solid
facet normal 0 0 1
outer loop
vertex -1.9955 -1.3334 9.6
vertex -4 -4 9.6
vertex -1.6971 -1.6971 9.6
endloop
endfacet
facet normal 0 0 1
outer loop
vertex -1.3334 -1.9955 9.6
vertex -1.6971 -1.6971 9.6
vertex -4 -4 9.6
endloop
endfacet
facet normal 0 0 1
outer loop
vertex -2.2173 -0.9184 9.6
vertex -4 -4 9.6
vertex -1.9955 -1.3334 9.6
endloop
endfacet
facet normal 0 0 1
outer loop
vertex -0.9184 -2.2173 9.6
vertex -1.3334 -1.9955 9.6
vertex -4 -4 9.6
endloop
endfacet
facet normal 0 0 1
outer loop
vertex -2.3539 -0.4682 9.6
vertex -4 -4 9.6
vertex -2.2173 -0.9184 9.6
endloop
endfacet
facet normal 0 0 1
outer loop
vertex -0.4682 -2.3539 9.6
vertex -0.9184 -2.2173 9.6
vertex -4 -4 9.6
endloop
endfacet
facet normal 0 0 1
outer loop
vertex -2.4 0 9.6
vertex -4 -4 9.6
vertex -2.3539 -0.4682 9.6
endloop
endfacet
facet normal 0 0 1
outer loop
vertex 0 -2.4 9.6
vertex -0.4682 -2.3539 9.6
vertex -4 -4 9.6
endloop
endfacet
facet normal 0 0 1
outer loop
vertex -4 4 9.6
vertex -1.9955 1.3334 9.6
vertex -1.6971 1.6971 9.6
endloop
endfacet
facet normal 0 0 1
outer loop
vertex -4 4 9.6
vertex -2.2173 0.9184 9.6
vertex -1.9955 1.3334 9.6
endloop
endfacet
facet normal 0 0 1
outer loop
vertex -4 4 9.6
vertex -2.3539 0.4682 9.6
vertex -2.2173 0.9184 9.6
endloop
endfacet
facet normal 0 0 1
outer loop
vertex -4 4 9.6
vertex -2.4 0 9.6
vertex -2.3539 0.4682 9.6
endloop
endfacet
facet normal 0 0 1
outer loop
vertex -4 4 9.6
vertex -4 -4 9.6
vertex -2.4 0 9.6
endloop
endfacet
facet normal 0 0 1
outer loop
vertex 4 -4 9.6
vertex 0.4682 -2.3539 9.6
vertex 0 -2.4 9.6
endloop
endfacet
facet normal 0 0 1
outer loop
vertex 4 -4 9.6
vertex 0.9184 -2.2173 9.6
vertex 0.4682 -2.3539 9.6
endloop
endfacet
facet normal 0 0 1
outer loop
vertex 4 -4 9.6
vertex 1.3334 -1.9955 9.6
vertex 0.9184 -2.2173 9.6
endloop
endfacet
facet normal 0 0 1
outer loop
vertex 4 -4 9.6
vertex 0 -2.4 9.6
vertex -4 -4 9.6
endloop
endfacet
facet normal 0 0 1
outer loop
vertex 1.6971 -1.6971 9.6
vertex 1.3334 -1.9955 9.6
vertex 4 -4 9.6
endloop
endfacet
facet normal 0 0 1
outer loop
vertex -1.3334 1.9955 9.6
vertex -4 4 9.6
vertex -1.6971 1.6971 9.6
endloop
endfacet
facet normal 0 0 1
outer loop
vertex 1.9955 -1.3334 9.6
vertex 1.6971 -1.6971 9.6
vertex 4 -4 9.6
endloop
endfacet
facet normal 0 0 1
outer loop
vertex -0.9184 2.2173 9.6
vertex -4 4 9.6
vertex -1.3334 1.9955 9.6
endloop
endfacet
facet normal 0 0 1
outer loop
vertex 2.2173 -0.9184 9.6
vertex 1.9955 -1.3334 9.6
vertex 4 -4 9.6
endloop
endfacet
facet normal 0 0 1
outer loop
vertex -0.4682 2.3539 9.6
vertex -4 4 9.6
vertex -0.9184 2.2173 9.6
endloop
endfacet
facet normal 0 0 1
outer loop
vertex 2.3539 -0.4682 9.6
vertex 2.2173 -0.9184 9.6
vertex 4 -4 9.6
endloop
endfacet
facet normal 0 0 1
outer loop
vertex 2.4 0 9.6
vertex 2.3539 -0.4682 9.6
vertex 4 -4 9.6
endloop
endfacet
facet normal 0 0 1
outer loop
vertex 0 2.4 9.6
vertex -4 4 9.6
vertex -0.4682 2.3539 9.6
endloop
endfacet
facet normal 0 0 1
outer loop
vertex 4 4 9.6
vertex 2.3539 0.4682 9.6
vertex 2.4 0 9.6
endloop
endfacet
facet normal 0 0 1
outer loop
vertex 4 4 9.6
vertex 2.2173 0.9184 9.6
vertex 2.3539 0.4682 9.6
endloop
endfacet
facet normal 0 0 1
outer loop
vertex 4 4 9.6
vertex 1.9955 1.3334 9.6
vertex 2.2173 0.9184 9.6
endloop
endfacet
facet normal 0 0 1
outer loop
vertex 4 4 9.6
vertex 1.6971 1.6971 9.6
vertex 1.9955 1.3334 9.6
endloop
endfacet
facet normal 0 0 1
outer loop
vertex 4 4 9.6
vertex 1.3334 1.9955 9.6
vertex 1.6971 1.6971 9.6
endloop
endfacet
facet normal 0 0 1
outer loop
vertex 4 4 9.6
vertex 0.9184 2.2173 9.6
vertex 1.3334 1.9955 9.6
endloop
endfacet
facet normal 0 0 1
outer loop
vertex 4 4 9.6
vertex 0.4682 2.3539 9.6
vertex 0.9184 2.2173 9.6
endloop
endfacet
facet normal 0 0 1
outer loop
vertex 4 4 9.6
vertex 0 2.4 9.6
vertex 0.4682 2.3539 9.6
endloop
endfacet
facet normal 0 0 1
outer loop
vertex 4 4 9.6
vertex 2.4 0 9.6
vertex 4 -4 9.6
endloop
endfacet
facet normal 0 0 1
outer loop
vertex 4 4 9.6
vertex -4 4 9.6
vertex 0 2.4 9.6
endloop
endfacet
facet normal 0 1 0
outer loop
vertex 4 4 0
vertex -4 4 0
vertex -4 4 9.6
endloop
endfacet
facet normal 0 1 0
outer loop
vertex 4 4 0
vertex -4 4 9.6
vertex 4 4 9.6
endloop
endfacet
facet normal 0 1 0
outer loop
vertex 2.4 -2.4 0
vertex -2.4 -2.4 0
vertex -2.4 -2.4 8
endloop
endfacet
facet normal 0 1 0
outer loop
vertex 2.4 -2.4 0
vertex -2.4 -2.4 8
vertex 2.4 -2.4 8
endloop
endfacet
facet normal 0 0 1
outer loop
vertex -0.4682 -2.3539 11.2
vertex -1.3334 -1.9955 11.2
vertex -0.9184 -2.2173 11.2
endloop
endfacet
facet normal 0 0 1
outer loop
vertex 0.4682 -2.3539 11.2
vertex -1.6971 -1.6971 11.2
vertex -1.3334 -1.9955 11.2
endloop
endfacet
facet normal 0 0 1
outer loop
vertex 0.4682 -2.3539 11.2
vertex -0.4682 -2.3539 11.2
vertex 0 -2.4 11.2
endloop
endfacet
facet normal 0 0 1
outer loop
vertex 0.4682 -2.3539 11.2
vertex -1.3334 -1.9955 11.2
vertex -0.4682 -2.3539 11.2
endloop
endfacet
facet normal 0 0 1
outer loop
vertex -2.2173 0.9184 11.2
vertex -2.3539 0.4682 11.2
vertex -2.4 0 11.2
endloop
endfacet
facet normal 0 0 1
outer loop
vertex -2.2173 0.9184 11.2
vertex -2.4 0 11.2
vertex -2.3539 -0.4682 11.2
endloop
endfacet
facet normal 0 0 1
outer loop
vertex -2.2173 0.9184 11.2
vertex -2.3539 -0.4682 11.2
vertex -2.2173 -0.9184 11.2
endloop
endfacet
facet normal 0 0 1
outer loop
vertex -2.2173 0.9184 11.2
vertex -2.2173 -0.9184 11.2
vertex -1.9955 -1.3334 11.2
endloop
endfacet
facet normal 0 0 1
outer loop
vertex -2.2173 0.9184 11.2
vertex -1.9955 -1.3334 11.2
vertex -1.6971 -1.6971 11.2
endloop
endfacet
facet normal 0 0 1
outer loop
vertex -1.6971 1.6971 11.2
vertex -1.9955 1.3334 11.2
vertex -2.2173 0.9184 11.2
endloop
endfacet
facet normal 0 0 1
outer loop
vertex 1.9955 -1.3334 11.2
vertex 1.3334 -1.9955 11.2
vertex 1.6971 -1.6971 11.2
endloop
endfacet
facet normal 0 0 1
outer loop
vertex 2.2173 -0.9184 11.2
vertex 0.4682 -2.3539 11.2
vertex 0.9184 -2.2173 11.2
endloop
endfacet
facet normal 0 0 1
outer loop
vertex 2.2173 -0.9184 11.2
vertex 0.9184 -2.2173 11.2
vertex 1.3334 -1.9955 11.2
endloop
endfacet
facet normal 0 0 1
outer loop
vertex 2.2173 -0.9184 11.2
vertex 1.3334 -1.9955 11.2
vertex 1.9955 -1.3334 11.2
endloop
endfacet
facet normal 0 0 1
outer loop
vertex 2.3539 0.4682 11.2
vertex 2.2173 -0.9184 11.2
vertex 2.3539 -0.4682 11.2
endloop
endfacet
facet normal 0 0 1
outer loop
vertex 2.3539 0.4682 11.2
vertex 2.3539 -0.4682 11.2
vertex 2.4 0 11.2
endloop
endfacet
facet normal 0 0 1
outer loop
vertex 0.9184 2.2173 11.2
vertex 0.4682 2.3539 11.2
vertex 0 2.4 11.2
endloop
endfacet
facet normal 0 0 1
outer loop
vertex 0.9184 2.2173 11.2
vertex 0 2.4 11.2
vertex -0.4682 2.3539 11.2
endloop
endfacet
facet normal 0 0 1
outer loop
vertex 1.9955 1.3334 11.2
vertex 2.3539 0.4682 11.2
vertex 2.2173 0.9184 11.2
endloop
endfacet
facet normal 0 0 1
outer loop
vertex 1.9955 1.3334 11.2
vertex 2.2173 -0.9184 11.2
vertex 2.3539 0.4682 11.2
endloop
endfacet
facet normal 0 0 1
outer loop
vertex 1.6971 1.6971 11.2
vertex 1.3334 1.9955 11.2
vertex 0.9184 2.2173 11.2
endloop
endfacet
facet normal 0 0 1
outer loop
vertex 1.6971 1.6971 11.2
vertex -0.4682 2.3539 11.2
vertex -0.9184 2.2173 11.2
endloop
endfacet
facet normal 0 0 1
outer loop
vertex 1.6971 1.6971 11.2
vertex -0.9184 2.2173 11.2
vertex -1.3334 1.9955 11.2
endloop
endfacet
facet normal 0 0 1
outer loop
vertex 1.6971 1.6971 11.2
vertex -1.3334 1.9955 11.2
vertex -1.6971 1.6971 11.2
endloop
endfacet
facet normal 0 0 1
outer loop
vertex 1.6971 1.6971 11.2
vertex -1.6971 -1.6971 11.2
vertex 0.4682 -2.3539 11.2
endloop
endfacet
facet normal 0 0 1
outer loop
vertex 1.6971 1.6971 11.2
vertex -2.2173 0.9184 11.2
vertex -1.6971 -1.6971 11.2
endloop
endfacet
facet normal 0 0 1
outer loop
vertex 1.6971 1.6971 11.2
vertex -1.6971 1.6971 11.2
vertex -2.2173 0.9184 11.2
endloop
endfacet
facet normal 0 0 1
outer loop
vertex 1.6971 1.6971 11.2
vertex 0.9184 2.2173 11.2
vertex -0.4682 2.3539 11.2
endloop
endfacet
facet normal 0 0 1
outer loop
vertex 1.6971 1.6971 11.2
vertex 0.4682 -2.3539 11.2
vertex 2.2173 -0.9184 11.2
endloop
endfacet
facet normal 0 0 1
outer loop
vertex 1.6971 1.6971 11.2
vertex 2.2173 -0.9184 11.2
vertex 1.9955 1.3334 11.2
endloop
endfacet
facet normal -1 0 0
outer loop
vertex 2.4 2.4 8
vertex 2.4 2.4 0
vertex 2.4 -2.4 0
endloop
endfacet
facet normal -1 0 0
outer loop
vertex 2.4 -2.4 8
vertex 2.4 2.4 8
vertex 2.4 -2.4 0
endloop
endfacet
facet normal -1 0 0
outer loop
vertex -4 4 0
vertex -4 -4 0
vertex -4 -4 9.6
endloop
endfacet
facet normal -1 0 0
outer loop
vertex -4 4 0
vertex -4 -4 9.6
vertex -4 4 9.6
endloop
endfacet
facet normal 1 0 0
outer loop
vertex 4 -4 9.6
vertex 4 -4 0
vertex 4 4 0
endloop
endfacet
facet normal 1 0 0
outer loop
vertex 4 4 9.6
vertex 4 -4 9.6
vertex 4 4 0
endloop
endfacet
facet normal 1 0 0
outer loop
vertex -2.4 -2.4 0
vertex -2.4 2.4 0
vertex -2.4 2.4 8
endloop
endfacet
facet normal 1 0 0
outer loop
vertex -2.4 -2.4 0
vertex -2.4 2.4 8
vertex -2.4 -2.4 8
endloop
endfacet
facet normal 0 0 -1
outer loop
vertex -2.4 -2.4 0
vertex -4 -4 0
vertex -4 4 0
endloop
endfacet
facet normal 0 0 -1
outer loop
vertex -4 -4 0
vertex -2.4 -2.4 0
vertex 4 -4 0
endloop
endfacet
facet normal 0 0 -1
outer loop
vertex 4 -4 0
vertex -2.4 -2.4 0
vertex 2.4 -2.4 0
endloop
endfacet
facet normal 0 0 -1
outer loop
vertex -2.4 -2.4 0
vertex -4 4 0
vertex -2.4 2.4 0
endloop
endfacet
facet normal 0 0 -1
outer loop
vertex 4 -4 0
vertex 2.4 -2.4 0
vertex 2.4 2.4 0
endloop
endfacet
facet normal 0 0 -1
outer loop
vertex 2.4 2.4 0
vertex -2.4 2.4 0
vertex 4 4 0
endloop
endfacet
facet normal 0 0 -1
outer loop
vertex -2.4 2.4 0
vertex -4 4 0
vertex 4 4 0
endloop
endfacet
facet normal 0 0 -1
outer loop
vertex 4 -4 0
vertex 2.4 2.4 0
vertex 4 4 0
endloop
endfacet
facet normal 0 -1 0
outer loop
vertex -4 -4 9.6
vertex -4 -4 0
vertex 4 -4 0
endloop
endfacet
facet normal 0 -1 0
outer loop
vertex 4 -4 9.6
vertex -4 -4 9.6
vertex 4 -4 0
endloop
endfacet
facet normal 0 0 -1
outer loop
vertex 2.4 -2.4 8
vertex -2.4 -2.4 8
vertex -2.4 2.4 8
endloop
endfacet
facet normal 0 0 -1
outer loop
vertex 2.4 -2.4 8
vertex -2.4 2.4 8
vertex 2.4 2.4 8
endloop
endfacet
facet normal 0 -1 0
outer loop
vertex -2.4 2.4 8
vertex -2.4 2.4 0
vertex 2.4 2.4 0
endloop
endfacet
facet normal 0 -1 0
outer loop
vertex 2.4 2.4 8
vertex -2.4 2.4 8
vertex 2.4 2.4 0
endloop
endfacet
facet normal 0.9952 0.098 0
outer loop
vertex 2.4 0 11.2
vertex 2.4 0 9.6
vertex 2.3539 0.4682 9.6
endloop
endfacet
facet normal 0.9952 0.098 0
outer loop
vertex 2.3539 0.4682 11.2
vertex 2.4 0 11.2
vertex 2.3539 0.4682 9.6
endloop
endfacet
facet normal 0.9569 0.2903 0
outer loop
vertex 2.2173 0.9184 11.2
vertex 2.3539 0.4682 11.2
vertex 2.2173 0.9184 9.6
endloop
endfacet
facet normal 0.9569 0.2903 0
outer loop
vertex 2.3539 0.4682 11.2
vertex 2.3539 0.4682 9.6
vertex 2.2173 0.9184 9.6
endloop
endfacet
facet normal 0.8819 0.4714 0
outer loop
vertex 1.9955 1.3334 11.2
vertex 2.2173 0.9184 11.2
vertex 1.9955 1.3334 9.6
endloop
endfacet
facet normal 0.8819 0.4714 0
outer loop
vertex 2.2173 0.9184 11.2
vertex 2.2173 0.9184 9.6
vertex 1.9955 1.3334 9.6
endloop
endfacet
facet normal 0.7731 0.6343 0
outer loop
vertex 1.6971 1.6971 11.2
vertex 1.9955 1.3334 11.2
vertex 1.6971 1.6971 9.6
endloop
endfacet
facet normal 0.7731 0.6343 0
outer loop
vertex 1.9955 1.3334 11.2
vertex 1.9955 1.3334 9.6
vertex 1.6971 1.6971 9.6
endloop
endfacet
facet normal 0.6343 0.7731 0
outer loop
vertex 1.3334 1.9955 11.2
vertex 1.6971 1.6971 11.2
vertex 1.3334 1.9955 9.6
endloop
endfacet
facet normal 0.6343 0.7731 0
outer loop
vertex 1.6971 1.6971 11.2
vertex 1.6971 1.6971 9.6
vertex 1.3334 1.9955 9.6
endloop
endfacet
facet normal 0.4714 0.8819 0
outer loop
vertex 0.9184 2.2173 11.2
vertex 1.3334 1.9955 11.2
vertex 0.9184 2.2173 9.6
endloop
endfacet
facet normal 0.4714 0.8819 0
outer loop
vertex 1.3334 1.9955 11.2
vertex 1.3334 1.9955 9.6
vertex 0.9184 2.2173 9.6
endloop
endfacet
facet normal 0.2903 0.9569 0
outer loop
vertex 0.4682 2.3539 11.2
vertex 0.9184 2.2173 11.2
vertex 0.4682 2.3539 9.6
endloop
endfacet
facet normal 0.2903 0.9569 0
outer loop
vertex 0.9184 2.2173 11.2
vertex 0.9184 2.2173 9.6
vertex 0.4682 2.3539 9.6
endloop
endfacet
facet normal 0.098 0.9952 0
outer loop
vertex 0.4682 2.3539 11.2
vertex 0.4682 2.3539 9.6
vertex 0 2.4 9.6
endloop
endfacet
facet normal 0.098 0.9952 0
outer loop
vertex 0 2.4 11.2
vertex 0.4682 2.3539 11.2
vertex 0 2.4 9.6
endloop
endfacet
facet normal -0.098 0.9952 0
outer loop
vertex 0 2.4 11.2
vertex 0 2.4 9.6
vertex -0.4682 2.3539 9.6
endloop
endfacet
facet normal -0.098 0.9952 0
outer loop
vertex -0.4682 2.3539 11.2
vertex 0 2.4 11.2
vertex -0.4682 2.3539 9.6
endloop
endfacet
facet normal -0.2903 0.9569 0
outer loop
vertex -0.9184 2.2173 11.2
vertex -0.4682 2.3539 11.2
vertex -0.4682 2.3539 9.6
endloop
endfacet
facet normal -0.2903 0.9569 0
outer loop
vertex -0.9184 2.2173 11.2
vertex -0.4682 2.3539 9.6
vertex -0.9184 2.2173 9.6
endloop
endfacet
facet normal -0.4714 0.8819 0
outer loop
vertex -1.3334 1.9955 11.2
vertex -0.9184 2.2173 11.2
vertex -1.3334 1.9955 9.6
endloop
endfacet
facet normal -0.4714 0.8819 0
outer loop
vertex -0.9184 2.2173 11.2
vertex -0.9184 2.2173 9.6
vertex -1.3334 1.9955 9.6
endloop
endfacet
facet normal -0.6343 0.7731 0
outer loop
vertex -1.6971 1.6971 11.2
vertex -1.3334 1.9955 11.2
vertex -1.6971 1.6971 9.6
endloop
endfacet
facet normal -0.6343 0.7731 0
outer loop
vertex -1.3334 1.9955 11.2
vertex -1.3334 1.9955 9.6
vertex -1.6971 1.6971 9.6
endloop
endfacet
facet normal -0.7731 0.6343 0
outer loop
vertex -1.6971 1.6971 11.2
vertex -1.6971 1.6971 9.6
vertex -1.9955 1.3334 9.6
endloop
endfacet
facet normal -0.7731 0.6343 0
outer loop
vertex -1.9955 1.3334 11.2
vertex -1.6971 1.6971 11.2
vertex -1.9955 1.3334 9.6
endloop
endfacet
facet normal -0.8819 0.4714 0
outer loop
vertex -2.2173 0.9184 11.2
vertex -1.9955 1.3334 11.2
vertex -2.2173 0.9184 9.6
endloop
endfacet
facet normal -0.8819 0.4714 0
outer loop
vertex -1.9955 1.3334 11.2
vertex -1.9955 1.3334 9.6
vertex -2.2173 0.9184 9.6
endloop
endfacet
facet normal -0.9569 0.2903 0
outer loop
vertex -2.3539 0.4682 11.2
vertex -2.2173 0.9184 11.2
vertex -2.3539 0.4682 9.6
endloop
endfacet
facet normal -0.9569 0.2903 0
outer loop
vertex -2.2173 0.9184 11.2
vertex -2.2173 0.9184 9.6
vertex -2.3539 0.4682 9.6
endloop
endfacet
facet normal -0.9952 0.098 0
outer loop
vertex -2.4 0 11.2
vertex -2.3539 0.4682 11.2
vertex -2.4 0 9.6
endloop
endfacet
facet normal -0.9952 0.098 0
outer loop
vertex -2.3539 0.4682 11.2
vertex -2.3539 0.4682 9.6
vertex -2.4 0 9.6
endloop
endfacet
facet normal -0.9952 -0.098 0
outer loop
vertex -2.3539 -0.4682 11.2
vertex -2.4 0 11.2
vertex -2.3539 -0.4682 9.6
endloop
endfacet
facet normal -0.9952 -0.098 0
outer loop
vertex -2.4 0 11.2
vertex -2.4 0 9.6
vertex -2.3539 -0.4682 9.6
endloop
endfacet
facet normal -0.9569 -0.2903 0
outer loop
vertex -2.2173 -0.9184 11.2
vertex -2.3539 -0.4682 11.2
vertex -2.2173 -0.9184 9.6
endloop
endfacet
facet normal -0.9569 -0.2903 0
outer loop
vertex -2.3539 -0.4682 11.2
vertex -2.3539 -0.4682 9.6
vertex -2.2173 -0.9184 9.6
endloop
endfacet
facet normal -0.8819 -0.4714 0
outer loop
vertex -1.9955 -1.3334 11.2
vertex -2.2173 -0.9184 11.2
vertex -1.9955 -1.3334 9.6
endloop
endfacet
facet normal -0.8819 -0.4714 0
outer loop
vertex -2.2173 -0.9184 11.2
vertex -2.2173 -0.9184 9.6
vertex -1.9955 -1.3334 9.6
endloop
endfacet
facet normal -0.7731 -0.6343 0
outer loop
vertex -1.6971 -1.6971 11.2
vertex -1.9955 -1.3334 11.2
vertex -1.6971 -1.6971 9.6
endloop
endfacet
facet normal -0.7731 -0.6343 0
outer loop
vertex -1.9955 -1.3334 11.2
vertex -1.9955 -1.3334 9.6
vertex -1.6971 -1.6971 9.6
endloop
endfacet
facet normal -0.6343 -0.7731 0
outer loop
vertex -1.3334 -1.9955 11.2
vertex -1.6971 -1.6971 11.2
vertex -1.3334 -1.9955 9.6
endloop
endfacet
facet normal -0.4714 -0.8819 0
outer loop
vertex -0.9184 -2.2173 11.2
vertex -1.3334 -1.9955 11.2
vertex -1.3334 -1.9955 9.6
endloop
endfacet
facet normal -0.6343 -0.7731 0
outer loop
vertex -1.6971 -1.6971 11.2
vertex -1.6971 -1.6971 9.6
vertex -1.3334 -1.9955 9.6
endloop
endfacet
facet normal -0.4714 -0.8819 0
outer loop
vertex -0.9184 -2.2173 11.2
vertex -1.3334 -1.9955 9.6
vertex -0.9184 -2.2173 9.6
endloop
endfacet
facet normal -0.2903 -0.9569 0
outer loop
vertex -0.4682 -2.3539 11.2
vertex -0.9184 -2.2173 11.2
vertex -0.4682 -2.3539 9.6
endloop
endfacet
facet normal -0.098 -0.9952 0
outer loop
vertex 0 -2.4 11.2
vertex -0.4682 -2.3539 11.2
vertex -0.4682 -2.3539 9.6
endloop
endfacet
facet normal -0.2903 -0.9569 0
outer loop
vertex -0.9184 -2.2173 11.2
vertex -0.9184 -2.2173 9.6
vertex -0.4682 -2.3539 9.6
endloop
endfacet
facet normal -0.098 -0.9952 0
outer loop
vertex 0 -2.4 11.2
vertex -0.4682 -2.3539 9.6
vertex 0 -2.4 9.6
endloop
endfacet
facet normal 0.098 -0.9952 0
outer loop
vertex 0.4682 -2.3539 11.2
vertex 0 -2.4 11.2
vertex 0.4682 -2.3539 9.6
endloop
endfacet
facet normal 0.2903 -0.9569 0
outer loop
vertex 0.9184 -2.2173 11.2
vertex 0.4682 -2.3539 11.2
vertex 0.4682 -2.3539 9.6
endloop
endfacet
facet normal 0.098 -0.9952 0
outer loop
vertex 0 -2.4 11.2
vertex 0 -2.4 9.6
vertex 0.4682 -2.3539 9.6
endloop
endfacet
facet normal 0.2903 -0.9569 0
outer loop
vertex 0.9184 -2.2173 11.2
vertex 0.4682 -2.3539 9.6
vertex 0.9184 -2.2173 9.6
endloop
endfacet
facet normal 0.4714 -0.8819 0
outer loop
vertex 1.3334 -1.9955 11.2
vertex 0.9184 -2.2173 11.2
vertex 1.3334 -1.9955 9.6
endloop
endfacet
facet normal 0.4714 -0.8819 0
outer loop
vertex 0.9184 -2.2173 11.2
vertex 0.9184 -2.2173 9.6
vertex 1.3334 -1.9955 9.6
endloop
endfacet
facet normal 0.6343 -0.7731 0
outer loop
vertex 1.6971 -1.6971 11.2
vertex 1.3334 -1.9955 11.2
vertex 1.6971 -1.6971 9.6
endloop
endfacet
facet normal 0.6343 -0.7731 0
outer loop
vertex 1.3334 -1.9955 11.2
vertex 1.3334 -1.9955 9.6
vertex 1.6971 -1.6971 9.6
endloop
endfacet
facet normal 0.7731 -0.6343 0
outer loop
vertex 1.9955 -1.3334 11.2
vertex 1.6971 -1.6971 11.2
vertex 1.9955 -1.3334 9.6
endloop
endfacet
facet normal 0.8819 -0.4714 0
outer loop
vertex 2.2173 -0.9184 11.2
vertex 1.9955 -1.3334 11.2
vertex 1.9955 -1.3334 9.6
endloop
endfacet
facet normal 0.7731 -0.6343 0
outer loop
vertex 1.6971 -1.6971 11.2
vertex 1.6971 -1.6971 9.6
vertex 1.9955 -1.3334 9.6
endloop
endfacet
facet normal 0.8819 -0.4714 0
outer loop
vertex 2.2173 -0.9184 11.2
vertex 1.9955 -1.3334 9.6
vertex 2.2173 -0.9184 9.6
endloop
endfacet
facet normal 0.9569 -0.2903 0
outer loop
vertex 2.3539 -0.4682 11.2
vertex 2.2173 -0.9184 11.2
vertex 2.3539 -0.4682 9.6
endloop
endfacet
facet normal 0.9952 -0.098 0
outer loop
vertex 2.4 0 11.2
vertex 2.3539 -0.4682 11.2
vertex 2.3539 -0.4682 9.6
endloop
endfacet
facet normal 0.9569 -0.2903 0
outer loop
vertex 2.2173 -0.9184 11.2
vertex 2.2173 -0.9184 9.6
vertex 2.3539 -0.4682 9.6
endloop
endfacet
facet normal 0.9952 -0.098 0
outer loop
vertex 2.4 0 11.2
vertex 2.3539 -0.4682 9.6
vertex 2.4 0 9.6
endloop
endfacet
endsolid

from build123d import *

# Parameters (mm, degrees)
F0_W     = 8
F0_H     = 8
F1_DEPTH = 9.6
F2_W     = 4.8
F2_H     = 4.8
F3_DEPTH = 8
F4_R     = 2.4
F5_DEPTH = 1.6


with BuildPart() as f1:
    # F0 (on Top) → F1 (new body)
    with BuildSketch(Plane.XY):
        Rectangle(F0_W, F0_H)
    extrude(amount=F1_DEPTH)

    # F2 (on face) → F3 (cut)
    with BuildSketch(Plane(origin=(0, 0, 0), x_dir=(1, 0, 0), z_dir=(0, 0, -1))):
        Rectangle(F2_W, F2_H)
    extrude(amount=-F3_DEPTH, mode=Mode.SUBTRACT)

    # F4 (on face) → F5 (join)
    with BuildSketch(Plane.XY.offset(9.6)):
        Circle(F4_R)
    extrude(amount=F5_DEPTH)


solid = f1.part
